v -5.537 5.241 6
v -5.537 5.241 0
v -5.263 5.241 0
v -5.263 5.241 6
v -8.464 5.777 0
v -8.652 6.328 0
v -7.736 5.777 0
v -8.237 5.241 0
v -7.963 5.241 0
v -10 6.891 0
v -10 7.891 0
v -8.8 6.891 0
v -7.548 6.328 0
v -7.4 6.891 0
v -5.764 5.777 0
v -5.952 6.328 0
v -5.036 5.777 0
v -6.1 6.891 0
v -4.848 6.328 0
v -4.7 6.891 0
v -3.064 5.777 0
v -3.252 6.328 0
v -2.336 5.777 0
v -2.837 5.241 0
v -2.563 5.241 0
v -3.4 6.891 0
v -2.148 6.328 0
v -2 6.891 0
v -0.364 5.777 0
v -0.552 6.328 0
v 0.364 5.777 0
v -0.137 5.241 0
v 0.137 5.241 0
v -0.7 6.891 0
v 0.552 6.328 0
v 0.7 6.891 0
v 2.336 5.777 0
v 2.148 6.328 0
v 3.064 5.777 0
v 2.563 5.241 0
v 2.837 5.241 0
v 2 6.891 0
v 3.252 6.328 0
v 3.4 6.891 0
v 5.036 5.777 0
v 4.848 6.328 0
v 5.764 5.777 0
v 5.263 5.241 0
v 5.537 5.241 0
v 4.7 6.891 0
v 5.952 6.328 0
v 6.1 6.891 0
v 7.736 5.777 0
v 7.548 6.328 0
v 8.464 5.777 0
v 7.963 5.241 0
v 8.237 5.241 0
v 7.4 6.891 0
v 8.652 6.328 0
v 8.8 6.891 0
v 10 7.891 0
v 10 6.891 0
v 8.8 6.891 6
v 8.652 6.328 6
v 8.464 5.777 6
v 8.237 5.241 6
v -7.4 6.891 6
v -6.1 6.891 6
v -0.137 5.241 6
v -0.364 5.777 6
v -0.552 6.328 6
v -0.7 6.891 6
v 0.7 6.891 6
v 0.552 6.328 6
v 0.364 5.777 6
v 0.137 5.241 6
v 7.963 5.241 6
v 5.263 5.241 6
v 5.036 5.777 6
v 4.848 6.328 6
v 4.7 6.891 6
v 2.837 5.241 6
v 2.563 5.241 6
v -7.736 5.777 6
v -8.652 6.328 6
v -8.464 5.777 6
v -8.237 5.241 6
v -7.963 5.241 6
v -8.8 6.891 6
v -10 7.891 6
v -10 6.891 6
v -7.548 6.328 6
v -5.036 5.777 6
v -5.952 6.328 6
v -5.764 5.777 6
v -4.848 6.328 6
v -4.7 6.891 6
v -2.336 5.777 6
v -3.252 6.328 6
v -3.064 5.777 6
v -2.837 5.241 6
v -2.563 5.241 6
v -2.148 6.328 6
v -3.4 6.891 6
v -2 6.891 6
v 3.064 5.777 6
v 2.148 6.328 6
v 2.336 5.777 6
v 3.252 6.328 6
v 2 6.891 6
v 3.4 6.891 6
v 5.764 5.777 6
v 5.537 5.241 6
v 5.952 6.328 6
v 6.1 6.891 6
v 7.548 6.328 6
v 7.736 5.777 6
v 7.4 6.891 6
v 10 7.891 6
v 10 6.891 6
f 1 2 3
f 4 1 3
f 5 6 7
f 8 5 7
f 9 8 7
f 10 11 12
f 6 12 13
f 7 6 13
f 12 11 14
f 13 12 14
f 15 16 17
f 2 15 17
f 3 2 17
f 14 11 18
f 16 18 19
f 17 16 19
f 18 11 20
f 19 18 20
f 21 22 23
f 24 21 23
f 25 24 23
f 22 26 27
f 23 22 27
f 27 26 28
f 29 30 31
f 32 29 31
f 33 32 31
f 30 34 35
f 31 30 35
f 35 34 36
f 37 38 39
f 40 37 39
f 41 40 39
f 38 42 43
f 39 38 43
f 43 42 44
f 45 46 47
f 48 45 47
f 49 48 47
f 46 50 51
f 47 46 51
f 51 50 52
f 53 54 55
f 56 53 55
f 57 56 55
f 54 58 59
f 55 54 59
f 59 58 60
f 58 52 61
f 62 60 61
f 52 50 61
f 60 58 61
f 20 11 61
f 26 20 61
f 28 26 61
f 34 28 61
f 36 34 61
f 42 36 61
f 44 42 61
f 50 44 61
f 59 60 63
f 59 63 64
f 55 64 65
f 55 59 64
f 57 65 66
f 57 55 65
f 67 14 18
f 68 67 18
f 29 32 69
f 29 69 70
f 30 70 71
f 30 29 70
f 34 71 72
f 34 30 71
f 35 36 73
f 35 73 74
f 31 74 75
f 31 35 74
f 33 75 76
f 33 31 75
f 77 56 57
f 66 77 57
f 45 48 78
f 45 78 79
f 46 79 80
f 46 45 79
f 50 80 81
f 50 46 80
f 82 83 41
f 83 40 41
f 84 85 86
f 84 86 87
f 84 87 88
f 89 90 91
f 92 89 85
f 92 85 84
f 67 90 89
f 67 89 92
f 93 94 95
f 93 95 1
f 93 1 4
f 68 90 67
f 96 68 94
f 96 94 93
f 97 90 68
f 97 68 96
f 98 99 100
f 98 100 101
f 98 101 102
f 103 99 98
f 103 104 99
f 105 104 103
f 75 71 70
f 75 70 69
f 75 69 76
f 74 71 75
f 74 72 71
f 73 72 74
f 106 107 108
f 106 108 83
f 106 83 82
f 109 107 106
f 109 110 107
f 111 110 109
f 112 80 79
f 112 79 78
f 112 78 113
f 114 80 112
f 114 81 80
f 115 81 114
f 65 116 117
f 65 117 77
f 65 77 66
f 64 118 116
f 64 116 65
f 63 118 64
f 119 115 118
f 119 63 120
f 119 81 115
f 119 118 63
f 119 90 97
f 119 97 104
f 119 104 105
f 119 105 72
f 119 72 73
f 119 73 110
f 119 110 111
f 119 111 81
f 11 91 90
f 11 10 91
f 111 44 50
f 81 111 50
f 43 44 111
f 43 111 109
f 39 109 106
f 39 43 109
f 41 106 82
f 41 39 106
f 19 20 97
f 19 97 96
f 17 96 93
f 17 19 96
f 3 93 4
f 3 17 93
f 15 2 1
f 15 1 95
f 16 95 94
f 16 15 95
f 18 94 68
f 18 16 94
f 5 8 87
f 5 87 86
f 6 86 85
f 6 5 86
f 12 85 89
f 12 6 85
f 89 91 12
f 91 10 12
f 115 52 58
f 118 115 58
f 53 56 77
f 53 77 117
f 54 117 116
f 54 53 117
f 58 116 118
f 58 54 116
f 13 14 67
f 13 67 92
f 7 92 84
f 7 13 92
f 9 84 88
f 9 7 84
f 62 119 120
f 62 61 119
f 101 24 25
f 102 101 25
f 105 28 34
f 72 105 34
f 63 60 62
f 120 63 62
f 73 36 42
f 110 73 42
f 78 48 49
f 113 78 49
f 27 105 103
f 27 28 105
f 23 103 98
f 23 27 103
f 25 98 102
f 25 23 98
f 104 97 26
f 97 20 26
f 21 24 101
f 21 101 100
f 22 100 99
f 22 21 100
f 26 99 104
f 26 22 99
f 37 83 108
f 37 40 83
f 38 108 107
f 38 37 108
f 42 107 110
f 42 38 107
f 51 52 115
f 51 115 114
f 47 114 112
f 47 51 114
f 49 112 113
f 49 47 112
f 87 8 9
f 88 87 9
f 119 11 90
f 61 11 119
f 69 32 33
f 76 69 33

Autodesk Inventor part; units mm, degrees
ref_plane "YZ Plane" through (0, 0, 0) normal (1, 0, 0) x (0, 1, 0)
ref_plane "XZ Plane" through (0, 0, 0) normal (0, 1, 0) x (-1, 0, 0)
ref_plane "XY Plane" through (0, 0, 0) normal (0, 0, 1) x (1, 0, 0)
sketch "Sketch1" plane through (0, 0, 0) normal (0, 0, 1) x (1, 0, 0)
  line L0 (0, -9.4281) -> (0, 9.3187)
  arc A0 (6.7496, 0.073) -> (6.51, 0.4187) centre (6.3746, 0.0689) ccw projected
  arc A1 (-6.7496, 0.073) -> (6.7496, 0.073) centre (0, 0) ccw projected
  arc A2 (-6.51, 0.4187) -> (-6.7496, 0.073) centre (-6.3746, 0.0689) ccw projected
  arc A3 (-4.3687, 0.6769) -> (-6.51, 0.4187) centre (-4.9321, -3.658) ccw projected
  arc A4 (-4.3687, 0.6769) -> (-4.2435, 0.7684) centre (-4.3542, 0.7885) ccw projected
  arc A5 (-4.2145, 0.914) -> (-4.2435, 0.7684) centre (0, 0) ccw projected
  arc A6 (-4.2145, 0.914) -> (-4.2952, 1.0464) centre (-4.3245, 0.9378) ccw projected
  arc A7 (-6.1747, 2.1045) -> (-4.2952, 1.0464) centre (-3.1568, 5.267) ccw projected
  arc A8 (-6.2638, 2.5155) -> (-6.1747, 2.1045) centre (-5.9158, 2.3758) ccw projected
  arc A9 (-6.0212, 3.0507) -> (-6.2638, 2.5155) centre (0, 0) ccw projected
  arc A10 (-5.6535, 3.2548) -> (-6.0212, 3.0507) centre (-5.6867, 2.8813) ccw projected
  arc A11 (-3.6188, 2.5393) -> (-5.6535, 3.2548) centre (-6.0413, -1.0993) ccw projected
  arc A12 (-3.6188, 2.5393) -> (-3.466, 2.566) centre (-3.5564, 2.633) ccw projected
  arc A13 (-3.3757, 2.6838) -> (-3.466, 2.566) centre (0, 0) ccw projected
  arc A14 (-3.3757, 2.6838) -> (-3.3894, 2.8382) centre (-3.4637, 2.7538) ccw projected
  arc A15 (-4.6071, 4.6184) -> (-3.3894, 2.8382) centre (-0.5017, 6.12) ccw projected
  arc A16 (-4.5052, 5.0265) -> (-4.6071, 4.6184) centre (-4.2549, 4.7472) ccw projected
  arc A17 (-4.051, 5.3993) -> (-4.5052, 5.0265) centre (0, 0) ccw projected
  arc A18 (-3.6309, 5.4196) -> (-4.051, 5.3993) centre (-3.8259, 5.0993) ccw projected
  arc A19 (-2.1225, 3.878) -> (-3.6309, 5.4196) centre (-5.9045, 1.6861) ccw projected
  arc A20 (-2.1225, 3.878) -> (-1.9736, 3.8344) centre (-2.0251, 3.9344) ccw projected
  arc A21 (-1.8405, 3.9) -> (-1.9736, 3.8344) centre (0, 0) ccw projected
  arc A22 (-1.8405, 3.9) -> (-1.7845, 4.0446) centre (-1.8886, 4.0017) ccw projected
  arc A23 (-2.0893, 6.1798) -> (-1.7845, 4.0446) centre (2.2568, 5.7108) ccw projected
  arc A24 (-1.8174, 6.5007) -> (-2.0893, 6.1798) centre (-1.7165, 6.1396) ccw projected
  arc A25 (-1.2452, 6.6342) -> (-1.8174, 6.5007) centre (0, 0) ccw projected
  arc A26 (-0.8594, 6.4666) -> (-1.2452, 6.6342) centre (-1.176, 6.2656) ccw projected
  arc A27 (-0.1884, 4.4168) -> (-0.8594, 6.4666) centre (-4.5499, 4.1237) ccw projected
  arc A28 (-0.1884, 4.4168) -> (-0.0742, 4.3119) centre (-0.0761, 4.4243) ccw projected
  arc A29 (0.0742, 4.3119) -> (-0.0742, 4.3119) centre (0, 0) ccw projected
  arc A30 (0.0742, 4.3119) -> (0.1884, 4.4168) centre (0.0761, 4.4243) ccw projected
  arc A31 (0.8594, 6.4666) -> (0.1884, 4.4168) centre (4.5499, 4.1237) ccw projected
  arc A32 (1.2452, 6.6342) -> (0.8594, 6.4666) centre (1.176, 6.2656) ccw projected
  arc A33 (1.8174, 6.5007) -> (1.2452, 6.6342) centre (0, 0) ccw projected
  arc A34 (2.0893, 6.1798) -> (1.8174, 6.5007) centre (1.7165, 6.1396) ccw projected
  arc A35 (1.7845, 4.0446) -> (2.0893, 6.1798) centre (-2.2568, 5.7108) ccw projected
  arc A36 (1.7845, 4.0446) -> (1.8405, 3.9) centre (1.8886, 4.0017) ccw projected
  arc A37 (1.9736, 3.8344) -> (1.8405, 3.9) centre (0, 0) ccw projected
  arc A38 (1.9736, 3.8344) -> (2.1225, 3.878) centre (2.0251, 3.9344) ccw projected
  arc A39 (3.6309, 5.4196) -> (2.1225, 3.878) centre (5.9045, 1.6861) ccw projected
  arc A40 (4.051, 5.3993) -> (3.6309, 5.4196) centre (3.8259, 5.0993) ccw projected
  arc A41 (4.5052, 5.0265) -> (4.051, 5.3993) centre (0, 0) ccw projected
  arc A42 (4.6071, 4.6184) -> (4.5052, 5.0265) centre (4.2549, 4.7472) ccw projected
  arc A43 (3.3894, 2.8382) -> (4.6071, 4.6184) centre (0.5017, 6.12) ccw projected
  arc A44 (3.3894, 2.8382) -> (3.3757, 2.6838) centre (3.4637, 2.7538) ccw projected
  arc A45 (3.466, 2.566) -> (3.3757, 2.6838) centre (0, 0) ccw projected
  arc A46 (3.466, 2.566) -> (3.6188, 2.5393) centre (3.5564, 2.633) ccw projected
  arc A47 (5.6535, 3.2548) -> (3.6188, 2.5393) centre (6.0413, -1.0993) ccw projected
  arc A48 (6.0212, 3.0507) -> (5.6535, 3.2548) centre (5.6867, 2.8813) ccw projected
  arc A49 (6.2638, 2.5155) -> (6.0212, 3.0507) centre (0, 0) ccw projected
  arc A50 (6.1747, 2.1045) -> (6.2638, 2.5155) centre (5.9158, 2.3758) ccw projected
  arc A51 (4.2952, 1.0464) -> (6.1747, 2.1045) centre (3.1568, 5.267) ccw projected
  arc A52 (4.2952, 1.0464) -> (4.2145, 0.914) centre (4.3245, 0.9378) ccw projected
  arc A53 (4.2435, 0.7684) -> (4.2145, 0.914) centre (0, 0) ccw projected
  arc A54 (4.2435, 0.7684) -> (4.3687, 0.6769) centre (4.3542, 0.7885) ccw projected
  arc A55 (6.51, 0.4187) -> (4.3687, 0.6769) centre (4.9321, -3.658) ccw projected
  circle A56 centre (0, 0) radius 1.5 projected
  line L1 (-10, 6.8906) -> (10, 6.8906)
  line L2 (-10, 6.8906) -> (-10, 7.8906)
  line L3 (-10, 7.8906) -> (10, 7.8906)
  line L4 (10, 7.8906) -> (10, 6.8906)
  line L5 (-10, 6.6406) -> (10, 6.6406) construction
  line L6 (0, 4.7099) -> (-1.3614, 7.6295) construction
  line L7 (-0.5881, 5.9711) -> (0.5881, 5.9711) construction
  line L8 (-1.4832, 7.8906) -> (0, 4.7099) construction
  line L9 (0.5881, 5.9711) -> (-0.5881, 5.9711) construction
  arc A57 (-0.7, 6.8906) -> (-0.1371, 5.2406) centre (7.2211, 8.6718) ccw
  line L10 (-0.1371, 5.2406) -> (0.1371, 5.2406)
  arc A58 (0.1371, 5.2406) -> (0.7, 6.8906) centre (-7.2211, 8.6718) ccw
  line L11 (-1.3728, 7.8906) -> (0, 4.9465) construction
  point P0 (0, 6.8906)
  dimension "d0" = 20
  dimension "d1" = 0.25
  dimension "d2" = 1
  dimension "d3" = 0.1
  dimension "d4" = 1.4
  dimension "d5" = 1.65
extrude "Extrusion1" add sketch "Sketch1" along normal blind 6 contours L10 A57 L1 L0 | L0 L1 A58 L10
sketch "Sketch3" plane through (0, 0, 0) normal (0, 0, 1) x (1, 0, 0)
  line L0 (-10, 7.8906) -> (10, 7.8906) projected
  line L1 (-10, 6.8906) -> (-10, 7.8906) projected
  line L2 (-10, 6.8906) -> (10, 6.8906) projected
  line L3 (10, 7.8906) -> (10, 6.8906) projected
  point P0 (0, 0)
extrude "Extrusion2" add sketch "Sketch3" along normal up to surface (6 mm away)
pattern_linear "Rectangular Pattern1" count 7 spacing 2.7 along (1, 0, 0) of "Extrusion1" first direction both ways yes
equation "\"d12\" = 3.6 * model_gear_module"
equation "\"model_gear_module\" = 0.75"
properties part number "rack_test"
